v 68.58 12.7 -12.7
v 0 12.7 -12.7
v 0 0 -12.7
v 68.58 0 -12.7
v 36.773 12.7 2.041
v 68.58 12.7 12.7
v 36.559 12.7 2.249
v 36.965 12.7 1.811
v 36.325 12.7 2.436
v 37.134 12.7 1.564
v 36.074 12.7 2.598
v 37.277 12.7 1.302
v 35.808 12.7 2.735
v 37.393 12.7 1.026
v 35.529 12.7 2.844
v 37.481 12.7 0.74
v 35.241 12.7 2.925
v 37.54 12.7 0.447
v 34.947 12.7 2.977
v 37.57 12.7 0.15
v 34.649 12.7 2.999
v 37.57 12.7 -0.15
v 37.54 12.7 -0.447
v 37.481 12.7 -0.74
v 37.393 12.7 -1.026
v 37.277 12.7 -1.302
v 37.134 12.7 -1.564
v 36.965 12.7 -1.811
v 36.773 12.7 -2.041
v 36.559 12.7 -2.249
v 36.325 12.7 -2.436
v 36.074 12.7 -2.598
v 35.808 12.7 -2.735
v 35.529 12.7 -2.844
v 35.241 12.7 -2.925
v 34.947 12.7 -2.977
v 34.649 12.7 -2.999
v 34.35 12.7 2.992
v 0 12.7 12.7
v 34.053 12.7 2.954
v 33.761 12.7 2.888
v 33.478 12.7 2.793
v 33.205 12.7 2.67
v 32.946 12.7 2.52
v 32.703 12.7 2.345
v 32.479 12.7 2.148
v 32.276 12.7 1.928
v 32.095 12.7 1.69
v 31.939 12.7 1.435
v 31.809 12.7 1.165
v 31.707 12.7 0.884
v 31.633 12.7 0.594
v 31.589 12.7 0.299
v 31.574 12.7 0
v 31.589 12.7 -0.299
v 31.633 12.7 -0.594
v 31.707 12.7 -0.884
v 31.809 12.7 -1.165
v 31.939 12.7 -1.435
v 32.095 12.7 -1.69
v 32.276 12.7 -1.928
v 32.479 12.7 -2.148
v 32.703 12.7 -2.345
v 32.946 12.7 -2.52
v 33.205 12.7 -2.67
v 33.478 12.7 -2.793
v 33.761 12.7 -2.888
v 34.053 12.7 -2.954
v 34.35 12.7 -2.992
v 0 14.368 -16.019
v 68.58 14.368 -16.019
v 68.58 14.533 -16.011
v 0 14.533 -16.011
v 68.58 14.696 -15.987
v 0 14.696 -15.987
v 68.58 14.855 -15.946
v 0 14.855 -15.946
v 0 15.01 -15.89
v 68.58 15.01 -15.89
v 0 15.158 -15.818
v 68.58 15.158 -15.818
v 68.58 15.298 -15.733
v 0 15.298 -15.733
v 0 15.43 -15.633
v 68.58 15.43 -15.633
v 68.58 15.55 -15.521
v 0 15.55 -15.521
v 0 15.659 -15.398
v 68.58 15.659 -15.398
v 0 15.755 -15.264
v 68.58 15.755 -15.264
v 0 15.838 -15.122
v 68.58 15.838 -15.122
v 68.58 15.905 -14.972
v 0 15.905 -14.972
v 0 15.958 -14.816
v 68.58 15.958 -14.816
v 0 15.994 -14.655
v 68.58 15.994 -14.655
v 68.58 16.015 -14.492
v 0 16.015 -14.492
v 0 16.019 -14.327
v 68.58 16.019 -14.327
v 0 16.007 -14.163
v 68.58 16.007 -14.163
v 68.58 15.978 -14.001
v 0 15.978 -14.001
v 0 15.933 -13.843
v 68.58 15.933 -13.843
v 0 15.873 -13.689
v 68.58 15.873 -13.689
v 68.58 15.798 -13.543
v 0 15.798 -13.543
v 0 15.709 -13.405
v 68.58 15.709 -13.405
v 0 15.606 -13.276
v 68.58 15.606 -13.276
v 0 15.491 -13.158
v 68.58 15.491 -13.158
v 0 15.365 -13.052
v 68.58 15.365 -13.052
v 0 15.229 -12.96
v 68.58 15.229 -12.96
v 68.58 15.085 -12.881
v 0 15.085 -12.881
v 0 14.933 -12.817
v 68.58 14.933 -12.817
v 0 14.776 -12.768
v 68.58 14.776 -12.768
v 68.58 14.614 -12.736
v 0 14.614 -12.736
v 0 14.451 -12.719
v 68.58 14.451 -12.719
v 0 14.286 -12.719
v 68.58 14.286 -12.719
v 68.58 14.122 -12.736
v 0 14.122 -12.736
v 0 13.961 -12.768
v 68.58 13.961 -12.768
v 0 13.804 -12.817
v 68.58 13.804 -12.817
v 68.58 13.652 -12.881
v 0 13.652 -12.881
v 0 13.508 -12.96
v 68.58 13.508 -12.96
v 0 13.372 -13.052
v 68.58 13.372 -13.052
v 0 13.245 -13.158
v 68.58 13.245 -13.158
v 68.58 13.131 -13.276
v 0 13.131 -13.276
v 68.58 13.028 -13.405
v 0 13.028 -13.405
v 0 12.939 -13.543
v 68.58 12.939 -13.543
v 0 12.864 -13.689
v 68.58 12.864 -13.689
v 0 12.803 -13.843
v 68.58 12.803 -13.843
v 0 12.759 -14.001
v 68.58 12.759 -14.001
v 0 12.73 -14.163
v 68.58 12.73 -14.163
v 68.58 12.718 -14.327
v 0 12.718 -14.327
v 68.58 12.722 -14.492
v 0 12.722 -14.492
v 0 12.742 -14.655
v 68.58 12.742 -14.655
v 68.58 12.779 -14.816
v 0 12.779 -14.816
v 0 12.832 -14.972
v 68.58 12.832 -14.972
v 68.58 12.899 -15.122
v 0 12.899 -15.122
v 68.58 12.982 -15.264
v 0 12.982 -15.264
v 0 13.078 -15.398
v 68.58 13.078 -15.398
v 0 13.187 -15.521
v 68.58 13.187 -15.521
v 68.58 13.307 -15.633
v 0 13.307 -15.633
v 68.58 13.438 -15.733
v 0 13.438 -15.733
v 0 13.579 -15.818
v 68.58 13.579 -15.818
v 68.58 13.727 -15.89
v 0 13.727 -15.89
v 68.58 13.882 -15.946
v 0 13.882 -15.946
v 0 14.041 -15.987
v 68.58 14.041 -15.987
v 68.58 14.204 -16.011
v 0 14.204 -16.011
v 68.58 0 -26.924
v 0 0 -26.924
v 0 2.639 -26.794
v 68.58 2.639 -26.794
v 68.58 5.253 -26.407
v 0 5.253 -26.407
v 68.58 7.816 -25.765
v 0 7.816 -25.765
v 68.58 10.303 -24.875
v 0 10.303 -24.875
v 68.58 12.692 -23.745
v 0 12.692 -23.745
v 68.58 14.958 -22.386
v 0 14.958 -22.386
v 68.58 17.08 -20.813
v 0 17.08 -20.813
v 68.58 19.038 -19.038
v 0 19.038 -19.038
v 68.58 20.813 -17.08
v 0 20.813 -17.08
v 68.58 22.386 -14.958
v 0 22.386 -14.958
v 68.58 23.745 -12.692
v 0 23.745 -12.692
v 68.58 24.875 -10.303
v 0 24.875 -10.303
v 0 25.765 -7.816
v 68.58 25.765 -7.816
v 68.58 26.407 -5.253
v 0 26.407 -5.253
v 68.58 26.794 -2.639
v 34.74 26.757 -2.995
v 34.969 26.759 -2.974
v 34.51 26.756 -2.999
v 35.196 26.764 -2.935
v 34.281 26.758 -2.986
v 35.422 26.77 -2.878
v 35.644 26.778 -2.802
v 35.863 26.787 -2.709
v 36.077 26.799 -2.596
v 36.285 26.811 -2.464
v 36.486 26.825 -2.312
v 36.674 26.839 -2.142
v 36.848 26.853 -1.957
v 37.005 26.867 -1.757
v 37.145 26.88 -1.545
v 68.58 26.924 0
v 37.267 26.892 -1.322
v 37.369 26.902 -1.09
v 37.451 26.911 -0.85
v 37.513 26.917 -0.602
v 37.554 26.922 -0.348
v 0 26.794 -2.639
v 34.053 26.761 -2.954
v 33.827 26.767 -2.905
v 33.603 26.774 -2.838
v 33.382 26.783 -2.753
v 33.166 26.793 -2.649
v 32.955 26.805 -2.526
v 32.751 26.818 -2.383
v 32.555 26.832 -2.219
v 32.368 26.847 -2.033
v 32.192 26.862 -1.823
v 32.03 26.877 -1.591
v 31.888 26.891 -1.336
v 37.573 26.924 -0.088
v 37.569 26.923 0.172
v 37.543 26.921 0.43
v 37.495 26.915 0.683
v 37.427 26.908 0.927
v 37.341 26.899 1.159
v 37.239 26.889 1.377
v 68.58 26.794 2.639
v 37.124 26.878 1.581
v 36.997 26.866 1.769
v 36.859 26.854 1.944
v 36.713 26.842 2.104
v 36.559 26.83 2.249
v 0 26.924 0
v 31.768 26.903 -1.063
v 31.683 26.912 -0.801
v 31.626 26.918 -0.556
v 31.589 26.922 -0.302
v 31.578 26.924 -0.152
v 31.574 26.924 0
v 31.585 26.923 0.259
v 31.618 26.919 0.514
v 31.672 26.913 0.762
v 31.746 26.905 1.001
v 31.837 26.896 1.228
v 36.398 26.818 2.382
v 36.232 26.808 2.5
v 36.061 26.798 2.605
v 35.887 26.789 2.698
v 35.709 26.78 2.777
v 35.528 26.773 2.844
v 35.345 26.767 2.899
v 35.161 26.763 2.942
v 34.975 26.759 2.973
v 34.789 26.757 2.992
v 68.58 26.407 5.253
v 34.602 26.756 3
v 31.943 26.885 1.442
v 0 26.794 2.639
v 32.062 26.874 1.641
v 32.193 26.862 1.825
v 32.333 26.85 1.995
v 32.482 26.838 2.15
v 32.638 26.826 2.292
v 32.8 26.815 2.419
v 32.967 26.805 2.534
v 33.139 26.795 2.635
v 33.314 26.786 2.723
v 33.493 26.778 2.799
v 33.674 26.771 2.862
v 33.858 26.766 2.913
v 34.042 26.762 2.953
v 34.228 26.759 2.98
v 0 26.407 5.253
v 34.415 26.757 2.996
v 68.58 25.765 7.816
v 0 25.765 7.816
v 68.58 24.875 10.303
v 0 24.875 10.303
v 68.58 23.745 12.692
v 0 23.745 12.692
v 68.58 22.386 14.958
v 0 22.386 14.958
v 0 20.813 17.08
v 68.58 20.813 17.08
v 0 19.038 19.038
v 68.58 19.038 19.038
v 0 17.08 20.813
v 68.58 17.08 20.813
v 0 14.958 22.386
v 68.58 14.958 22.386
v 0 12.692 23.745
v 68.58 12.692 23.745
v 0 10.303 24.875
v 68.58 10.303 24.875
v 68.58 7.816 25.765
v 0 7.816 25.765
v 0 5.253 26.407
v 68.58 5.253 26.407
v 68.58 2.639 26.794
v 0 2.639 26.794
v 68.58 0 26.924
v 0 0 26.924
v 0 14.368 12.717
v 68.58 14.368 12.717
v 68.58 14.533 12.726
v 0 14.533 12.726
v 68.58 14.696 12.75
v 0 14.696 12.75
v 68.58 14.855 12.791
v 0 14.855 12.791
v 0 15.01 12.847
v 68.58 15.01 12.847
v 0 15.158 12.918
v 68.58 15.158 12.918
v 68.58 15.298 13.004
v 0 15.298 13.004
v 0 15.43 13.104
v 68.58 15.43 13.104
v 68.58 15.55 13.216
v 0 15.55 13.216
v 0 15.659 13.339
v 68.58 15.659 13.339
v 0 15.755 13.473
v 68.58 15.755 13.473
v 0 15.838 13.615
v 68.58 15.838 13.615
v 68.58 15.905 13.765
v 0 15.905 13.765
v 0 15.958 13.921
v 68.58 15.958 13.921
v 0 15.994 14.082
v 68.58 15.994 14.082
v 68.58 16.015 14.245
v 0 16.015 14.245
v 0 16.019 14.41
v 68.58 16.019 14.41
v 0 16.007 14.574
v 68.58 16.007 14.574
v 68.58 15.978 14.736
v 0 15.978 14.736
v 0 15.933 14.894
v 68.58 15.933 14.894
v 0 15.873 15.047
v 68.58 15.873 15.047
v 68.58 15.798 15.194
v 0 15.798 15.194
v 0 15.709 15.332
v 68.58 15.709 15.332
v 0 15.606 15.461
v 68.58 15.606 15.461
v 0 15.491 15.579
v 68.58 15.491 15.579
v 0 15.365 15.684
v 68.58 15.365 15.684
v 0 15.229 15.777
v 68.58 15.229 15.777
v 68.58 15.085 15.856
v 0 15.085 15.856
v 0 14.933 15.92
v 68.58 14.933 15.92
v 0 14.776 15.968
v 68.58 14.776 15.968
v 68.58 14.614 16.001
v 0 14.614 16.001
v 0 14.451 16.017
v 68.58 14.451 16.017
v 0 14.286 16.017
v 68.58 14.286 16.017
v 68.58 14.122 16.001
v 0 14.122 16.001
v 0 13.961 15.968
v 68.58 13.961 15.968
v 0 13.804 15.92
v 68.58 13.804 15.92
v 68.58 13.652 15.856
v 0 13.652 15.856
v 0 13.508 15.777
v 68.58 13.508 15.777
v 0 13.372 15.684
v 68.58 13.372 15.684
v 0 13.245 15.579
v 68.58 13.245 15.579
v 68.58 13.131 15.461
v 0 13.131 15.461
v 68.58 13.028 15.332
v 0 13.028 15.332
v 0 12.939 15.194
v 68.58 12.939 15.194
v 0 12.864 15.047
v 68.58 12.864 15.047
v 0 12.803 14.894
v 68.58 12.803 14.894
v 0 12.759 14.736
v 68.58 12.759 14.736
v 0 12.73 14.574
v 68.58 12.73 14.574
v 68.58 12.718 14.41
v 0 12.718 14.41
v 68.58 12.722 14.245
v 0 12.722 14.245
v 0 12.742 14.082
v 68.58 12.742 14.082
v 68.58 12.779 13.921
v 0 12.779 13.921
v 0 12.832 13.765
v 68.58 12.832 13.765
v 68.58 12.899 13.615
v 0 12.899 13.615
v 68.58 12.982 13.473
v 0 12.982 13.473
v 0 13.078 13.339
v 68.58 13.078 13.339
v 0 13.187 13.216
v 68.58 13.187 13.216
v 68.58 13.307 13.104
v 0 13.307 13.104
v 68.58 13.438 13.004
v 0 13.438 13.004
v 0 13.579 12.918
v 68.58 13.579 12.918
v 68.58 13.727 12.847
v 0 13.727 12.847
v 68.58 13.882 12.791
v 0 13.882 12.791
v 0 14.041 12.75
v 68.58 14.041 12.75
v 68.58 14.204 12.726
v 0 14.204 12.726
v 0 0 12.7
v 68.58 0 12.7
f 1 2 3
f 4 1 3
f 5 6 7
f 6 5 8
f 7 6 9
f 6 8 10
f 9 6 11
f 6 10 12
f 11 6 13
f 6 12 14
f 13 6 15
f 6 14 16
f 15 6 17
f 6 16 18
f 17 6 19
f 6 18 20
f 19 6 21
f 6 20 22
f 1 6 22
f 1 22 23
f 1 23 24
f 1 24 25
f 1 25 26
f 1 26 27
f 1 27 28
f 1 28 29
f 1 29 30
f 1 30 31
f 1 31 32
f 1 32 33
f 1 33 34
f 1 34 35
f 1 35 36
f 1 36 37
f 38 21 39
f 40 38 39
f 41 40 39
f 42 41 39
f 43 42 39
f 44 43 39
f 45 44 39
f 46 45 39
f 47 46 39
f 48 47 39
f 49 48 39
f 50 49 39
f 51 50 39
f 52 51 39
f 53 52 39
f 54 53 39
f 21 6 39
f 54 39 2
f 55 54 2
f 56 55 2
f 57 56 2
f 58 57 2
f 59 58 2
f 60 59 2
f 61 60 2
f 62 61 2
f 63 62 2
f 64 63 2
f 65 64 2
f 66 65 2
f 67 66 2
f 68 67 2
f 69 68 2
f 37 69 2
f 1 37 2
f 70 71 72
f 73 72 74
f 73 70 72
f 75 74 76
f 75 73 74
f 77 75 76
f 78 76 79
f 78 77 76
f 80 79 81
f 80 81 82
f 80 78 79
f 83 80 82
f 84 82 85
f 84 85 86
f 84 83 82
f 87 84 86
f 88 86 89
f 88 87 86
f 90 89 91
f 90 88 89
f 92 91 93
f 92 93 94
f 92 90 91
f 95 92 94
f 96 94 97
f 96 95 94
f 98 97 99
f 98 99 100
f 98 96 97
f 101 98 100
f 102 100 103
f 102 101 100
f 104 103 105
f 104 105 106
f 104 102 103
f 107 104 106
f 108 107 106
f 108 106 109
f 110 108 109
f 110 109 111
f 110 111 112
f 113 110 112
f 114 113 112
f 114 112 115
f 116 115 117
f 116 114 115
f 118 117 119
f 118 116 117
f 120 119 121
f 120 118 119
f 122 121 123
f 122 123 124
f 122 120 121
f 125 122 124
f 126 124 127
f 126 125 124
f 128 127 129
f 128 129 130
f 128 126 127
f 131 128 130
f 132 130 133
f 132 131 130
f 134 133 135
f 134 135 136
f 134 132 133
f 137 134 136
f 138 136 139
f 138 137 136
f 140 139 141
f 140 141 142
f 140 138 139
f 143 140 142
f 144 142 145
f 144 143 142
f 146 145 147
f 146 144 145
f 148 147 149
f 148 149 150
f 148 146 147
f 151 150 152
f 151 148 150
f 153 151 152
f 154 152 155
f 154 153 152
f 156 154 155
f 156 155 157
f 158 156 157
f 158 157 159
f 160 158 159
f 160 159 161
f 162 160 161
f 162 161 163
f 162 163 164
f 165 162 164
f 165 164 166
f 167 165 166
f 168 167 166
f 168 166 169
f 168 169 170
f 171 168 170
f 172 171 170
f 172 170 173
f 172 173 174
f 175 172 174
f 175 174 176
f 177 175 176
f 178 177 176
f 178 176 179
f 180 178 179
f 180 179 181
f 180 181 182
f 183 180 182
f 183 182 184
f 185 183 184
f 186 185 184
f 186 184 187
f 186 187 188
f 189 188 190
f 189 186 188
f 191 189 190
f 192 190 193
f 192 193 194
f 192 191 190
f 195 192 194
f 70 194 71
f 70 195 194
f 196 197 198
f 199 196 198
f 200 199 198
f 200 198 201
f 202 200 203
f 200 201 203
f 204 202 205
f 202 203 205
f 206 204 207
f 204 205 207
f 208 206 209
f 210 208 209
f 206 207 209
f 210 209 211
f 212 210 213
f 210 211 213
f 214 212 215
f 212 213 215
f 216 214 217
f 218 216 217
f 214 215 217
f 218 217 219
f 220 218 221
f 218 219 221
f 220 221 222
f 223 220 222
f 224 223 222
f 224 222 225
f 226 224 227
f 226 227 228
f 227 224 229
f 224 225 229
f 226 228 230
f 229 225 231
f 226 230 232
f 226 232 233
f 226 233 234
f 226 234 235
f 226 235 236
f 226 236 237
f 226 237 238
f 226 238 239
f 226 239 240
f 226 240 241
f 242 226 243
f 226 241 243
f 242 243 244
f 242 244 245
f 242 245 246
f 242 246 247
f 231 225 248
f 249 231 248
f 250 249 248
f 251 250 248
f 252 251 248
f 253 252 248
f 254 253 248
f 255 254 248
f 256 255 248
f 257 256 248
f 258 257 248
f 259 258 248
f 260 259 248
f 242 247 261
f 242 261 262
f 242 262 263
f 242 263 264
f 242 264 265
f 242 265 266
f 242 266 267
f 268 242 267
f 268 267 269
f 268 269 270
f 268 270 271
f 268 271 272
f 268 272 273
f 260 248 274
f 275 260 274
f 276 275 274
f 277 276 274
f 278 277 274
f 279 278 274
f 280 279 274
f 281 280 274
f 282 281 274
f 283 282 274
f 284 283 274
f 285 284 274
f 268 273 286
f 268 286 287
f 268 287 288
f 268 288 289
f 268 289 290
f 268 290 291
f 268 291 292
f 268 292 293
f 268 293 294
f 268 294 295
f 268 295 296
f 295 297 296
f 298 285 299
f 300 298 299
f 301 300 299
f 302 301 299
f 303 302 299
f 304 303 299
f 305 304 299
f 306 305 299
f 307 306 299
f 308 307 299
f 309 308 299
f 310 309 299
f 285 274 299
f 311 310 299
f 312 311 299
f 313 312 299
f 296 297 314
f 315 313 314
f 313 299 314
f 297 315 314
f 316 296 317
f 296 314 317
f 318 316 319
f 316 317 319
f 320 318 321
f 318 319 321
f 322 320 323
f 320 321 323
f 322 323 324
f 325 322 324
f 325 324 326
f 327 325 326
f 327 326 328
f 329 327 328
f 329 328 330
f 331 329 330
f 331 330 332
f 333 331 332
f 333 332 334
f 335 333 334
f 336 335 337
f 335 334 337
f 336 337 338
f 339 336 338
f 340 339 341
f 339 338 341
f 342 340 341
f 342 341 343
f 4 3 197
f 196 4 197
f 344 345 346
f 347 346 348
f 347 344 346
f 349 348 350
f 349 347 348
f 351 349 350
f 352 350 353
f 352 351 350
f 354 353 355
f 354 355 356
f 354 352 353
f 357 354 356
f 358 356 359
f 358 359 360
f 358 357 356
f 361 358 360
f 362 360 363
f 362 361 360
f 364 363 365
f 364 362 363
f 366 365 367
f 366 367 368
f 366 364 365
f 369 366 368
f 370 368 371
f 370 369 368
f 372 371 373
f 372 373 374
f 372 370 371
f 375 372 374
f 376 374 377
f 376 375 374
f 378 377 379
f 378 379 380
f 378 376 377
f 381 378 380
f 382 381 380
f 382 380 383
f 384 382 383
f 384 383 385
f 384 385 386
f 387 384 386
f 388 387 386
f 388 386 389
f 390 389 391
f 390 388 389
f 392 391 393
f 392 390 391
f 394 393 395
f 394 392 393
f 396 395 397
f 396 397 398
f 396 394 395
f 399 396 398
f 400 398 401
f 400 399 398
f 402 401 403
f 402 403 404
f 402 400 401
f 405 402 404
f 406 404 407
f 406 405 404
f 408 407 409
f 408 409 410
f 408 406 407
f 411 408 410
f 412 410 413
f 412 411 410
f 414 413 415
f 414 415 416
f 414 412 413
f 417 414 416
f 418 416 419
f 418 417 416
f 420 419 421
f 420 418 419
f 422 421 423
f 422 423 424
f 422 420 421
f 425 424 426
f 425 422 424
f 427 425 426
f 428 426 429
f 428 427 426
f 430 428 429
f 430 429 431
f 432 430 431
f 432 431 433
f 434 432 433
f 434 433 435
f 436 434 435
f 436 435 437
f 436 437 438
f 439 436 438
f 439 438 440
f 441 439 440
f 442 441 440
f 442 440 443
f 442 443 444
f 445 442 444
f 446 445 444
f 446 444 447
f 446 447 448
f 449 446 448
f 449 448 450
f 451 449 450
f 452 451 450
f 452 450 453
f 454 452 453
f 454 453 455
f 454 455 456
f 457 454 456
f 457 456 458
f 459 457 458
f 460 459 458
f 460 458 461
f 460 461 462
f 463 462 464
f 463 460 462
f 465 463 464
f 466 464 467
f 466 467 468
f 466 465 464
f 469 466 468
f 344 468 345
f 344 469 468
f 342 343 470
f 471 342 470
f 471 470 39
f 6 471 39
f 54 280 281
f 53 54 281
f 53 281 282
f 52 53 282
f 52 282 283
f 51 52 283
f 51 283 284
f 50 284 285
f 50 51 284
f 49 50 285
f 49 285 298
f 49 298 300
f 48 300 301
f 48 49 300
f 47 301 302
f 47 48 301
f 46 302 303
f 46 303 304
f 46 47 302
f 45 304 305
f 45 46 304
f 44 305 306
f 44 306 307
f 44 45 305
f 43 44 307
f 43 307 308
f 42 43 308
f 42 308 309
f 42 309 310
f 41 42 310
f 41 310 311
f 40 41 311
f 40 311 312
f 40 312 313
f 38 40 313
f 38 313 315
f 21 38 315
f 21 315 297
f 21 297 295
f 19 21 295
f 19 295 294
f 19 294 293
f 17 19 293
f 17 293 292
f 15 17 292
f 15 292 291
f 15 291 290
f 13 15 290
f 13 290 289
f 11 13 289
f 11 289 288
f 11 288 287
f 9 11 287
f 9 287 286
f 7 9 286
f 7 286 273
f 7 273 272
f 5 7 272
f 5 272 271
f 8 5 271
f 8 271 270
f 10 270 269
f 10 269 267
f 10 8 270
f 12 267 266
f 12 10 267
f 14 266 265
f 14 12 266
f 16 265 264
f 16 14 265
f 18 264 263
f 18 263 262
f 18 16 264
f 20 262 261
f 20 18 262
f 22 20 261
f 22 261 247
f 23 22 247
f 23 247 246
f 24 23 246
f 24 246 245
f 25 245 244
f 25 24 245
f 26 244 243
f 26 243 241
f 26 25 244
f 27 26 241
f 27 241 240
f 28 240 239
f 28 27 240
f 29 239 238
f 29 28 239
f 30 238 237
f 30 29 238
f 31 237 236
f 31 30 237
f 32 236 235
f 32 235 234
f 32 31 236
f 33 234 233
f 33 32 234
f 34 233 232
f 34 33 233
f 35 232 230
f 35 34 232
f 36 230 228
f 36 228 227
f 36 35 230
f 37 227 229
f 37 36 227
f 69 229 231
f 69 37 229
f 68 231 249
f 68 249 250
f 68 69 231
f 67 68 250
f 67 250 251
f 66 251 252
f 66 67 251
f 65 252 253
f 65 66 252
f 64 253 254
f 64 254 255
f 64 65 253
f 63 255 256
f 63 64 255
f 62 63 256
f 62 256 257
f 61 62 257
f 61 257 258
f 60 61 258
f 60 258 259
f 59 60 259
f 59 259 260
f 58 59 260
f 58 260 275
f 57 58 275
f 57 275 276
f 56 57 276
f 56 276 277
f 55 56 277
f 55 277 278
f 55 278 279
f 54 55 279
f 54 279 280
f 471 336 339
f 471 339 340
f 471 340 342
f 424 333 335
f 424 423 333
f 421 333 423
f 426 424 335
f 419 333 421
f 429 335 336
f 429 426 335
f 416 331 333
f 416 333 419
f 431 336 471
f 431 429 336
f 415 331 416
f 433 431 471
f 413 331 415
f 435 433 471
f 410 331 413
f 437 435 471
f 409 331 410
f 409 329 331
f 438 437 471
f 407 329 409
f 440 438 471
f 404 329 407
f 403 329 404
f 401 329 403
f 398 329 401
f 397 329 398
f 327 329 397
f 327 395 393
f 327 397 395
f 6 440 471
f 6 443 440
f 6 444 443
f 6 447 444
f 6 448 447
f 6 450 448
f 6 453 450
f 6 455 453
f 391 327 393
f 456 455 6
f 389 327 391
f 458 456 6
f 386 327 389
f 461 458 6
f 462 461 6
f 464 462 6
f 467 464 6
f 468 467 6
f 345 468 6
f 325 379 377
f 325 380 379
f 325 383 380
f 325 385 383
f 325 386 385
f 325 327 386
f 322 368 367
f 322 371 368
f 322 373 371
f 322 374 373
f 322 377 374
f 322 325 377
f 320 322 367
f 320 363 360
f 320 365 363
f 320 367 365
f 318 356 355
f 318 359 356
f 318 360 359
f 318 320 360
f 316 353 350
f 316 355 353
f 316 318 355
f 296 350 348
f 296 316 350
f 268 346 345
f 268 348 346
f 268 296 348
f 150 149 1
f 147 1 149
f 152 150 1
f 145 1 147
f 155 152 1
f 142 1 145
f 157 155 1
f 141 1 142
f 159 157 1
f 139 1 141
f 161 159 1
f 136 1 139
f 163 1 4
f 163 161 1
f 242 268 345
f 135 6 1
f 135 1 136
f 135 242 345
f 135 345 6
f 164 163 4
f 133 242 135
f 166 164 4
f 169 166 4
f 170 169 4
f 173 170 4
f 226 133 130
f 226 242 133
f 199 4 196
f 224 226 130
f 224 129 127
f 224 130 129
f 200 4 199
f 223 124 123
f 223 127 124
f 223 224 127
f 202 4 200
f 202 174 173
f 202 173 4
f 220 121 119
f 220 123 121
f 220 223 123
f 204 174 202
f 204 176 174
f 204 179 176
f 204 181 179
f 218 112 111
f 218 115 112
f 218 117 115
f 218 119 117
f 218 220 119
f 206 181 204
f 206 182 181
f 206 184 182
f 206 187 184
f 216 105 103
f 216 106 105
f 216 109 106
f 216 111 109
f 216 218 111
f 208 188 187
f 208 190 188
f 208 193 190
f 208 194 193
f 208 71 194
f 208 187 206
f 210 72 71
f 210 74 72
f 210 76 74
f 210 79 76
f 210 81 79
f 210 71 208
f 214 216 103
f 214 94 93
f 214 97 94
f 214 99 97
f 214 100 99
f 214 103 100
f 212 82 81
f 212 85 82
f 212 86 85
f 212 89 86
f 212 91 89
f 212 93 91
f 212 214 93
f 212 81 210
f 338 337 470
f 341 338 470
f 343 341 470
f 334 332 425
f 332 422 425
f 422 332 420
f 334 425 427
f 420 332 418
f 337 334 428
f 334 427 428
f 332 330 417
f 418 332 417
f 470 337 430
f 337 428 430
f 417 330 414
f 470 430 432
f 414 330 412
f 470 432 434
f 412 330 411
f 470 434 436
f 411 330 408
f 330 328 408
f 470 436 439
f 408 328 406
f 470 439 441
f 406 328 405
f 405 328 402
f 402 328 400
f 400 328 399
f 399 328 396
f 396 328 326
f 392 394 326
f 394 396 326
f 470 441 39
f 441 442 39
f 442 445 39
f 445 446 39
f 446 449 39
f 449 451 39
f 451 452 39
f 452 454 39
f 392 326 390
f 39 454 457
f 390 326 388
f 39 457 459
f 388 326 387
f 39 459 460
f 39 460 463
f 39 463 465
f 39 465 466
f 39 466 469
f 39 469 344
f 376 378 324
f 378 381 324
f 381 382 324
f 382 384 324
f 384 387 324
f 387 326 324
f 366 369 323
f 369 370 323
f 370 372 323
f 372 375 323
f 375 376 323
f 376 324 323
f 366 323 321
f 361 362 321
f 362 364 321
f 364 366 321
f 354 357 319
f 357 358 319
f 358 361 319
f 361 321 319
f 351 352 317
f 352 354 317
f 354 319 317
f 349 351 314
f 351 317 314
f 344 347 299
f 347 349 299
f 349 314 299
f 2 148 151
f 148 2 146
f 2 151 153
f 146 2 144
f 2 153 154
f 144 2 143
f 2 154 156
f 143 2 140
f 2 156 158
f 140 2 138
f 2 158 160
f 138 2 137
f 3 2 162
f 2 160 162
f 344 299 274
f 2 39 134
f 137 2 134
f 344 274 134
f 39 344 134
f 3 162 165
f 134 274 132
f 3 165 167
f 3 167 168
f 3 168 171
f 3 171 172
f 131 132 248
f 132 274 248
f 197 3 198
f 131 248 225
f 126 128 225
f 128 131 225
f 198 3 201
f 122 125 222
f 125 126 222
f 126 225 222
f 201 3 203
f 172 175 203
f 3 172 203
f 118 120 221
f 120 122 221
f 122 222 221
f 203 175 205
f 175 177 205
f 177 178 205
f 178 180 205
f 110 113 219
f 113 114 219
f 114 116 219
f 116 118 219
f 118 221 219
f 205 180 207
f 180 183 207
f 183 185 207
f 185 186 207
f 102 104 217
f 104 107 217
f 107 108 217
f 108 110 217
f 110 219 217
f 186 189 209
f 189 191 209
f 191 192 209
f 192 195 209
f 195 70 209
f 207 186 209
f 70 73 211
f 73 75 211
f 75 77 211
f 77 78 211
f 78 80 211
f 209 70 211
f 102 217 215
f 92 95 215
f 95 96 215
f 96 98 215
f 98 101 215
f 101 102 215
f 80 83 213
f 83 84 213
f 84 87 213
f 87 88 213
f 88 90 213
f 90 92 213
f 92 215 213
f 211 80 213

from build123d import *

# Parameters (mm, degrees)
SKETCH2_R               = 1.651
BOSS_EXTRUDE1_DEPTH     = 68.58
CUT_EXTRUDE3_DEPTH      = 79.441187854
CUT_EXTRUDE3_DEPTH_BACK = 79.441187854
SKETCH3_R               = 3


with BuildPart() as part:
    # Sketch2 → Boss-Extrude1 (new body)
    with BuildSketch(Plane(origin=(0, 0, 0), x_dir=(0, 0, -1), z_dir=(1, 0, 0))):
        with BuildLine():
            Line((-12.7, 12.7), (12.7, 12.7))
            Line((12.7, 12.7), (12.7, 0))
            Line((12.7, 0), (26.924, 0))
            ThreePointArc((26.924, 0), (0, 26.924), (-26.924, 0))
            Line((-26.924, 0), (-12.7, 0))
            Line((-12.7, 0), (-12.7, 12.7))
        make_face()
        with Locations((14.368409794, 14.368409794)):
            Circle(SKETCH2_R, mode=Mode.SUBTRACT)
        with Locations((-14.368409794, 14.368409794)):
            Circle(SKETCH2_R, mode=Mode.SUBTRACT)
    extrude(amount=BOSS_EXTRUDE1_DEPTH)

    # Sketch3 → Cut-Extrude3 (cut, two sides: drawn at the far end of the back side and taken through both)
    with BuildSketch(Plane(origin=(0, 0, 0), x_dir=(1, 0, 0), z_dir=(0, 1, 0)).offset(-CUT_EXTRUDE3_DEPTH_BACK)):
        with Locations(Location((34.57387325, 0, 0), (0, 0, 180))):
            Circle(SKETCH3_R)
    extrude(amount=CUT_EXTRUDE3_DEPTH + CUT_EXTRUDE3_DEPTH_BACK, mode=Mode.SUBTRACT)


solid = part.part
